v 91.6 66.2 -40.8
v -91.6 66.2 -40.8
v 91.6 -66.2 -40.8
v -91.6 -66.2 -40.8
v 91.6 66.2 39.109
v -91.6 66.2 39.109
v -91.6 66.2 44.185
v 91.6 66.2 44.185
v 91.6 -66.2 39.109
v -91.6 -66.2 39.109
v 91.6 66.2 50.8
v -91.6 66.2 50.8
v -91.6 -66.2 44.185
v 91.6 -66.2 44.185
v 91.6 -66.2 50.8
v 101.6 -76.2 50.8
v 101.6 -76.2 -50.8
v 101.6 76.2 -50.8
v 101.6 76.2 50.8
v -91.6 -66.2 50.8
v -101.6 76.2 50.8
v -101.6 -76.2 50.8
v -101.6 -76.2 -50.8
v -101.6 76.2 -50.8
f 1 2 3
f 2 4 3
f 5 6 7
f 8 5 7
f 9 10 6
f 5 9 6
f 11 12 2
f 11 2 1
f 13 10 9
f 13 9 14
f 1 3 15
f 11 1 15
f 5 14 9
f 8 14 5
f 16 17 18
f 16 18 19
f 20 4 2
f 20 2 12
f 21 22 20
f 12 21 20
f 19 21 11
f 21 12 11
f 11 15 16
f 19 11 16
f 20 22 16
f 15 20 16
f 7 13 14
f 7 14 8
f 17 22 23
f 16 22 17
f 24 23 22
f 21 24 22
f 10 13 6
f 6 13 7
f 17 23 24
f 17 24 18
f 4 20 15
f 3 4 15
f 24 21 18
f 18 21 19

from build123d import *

# Parameters (mm, degrees)
F0_W     = 203.2
F0_H     = 101.6
F1_DEPTH = 76.2
F2_T     = -10
F3_W     = 132.4
F3_H     = 5.0765872002
F4_DEPTH = 183.20004


with BuildPart() as f1:
    # F0 (on Front) → F1 (new body, symmetric)
    with BuildSketch(Plane.XZ):
        Rectangle(F0_W, F0_H)
    extrude(amount=F1_DEPTH, both=True)

    # F2
    f2_openings = [f1.faces().sort_by_distance(p)[0] for p in [
        (0, 0, 50.8),
    ]]
    offset(amount=F2_T, openings=f2_openings)


with BuildPart() as f4:
    # F3 (on face) → F4 (new body)
    with BuildSketch(Plane.YZ.offset(-91.6)):
        with Locations((0, 41.6471213102)):
            Rectangle(F3_W, F3_H)
    extrude(amount=F4_DEPTH)


solid = Compound([f1.part, f4.part])
